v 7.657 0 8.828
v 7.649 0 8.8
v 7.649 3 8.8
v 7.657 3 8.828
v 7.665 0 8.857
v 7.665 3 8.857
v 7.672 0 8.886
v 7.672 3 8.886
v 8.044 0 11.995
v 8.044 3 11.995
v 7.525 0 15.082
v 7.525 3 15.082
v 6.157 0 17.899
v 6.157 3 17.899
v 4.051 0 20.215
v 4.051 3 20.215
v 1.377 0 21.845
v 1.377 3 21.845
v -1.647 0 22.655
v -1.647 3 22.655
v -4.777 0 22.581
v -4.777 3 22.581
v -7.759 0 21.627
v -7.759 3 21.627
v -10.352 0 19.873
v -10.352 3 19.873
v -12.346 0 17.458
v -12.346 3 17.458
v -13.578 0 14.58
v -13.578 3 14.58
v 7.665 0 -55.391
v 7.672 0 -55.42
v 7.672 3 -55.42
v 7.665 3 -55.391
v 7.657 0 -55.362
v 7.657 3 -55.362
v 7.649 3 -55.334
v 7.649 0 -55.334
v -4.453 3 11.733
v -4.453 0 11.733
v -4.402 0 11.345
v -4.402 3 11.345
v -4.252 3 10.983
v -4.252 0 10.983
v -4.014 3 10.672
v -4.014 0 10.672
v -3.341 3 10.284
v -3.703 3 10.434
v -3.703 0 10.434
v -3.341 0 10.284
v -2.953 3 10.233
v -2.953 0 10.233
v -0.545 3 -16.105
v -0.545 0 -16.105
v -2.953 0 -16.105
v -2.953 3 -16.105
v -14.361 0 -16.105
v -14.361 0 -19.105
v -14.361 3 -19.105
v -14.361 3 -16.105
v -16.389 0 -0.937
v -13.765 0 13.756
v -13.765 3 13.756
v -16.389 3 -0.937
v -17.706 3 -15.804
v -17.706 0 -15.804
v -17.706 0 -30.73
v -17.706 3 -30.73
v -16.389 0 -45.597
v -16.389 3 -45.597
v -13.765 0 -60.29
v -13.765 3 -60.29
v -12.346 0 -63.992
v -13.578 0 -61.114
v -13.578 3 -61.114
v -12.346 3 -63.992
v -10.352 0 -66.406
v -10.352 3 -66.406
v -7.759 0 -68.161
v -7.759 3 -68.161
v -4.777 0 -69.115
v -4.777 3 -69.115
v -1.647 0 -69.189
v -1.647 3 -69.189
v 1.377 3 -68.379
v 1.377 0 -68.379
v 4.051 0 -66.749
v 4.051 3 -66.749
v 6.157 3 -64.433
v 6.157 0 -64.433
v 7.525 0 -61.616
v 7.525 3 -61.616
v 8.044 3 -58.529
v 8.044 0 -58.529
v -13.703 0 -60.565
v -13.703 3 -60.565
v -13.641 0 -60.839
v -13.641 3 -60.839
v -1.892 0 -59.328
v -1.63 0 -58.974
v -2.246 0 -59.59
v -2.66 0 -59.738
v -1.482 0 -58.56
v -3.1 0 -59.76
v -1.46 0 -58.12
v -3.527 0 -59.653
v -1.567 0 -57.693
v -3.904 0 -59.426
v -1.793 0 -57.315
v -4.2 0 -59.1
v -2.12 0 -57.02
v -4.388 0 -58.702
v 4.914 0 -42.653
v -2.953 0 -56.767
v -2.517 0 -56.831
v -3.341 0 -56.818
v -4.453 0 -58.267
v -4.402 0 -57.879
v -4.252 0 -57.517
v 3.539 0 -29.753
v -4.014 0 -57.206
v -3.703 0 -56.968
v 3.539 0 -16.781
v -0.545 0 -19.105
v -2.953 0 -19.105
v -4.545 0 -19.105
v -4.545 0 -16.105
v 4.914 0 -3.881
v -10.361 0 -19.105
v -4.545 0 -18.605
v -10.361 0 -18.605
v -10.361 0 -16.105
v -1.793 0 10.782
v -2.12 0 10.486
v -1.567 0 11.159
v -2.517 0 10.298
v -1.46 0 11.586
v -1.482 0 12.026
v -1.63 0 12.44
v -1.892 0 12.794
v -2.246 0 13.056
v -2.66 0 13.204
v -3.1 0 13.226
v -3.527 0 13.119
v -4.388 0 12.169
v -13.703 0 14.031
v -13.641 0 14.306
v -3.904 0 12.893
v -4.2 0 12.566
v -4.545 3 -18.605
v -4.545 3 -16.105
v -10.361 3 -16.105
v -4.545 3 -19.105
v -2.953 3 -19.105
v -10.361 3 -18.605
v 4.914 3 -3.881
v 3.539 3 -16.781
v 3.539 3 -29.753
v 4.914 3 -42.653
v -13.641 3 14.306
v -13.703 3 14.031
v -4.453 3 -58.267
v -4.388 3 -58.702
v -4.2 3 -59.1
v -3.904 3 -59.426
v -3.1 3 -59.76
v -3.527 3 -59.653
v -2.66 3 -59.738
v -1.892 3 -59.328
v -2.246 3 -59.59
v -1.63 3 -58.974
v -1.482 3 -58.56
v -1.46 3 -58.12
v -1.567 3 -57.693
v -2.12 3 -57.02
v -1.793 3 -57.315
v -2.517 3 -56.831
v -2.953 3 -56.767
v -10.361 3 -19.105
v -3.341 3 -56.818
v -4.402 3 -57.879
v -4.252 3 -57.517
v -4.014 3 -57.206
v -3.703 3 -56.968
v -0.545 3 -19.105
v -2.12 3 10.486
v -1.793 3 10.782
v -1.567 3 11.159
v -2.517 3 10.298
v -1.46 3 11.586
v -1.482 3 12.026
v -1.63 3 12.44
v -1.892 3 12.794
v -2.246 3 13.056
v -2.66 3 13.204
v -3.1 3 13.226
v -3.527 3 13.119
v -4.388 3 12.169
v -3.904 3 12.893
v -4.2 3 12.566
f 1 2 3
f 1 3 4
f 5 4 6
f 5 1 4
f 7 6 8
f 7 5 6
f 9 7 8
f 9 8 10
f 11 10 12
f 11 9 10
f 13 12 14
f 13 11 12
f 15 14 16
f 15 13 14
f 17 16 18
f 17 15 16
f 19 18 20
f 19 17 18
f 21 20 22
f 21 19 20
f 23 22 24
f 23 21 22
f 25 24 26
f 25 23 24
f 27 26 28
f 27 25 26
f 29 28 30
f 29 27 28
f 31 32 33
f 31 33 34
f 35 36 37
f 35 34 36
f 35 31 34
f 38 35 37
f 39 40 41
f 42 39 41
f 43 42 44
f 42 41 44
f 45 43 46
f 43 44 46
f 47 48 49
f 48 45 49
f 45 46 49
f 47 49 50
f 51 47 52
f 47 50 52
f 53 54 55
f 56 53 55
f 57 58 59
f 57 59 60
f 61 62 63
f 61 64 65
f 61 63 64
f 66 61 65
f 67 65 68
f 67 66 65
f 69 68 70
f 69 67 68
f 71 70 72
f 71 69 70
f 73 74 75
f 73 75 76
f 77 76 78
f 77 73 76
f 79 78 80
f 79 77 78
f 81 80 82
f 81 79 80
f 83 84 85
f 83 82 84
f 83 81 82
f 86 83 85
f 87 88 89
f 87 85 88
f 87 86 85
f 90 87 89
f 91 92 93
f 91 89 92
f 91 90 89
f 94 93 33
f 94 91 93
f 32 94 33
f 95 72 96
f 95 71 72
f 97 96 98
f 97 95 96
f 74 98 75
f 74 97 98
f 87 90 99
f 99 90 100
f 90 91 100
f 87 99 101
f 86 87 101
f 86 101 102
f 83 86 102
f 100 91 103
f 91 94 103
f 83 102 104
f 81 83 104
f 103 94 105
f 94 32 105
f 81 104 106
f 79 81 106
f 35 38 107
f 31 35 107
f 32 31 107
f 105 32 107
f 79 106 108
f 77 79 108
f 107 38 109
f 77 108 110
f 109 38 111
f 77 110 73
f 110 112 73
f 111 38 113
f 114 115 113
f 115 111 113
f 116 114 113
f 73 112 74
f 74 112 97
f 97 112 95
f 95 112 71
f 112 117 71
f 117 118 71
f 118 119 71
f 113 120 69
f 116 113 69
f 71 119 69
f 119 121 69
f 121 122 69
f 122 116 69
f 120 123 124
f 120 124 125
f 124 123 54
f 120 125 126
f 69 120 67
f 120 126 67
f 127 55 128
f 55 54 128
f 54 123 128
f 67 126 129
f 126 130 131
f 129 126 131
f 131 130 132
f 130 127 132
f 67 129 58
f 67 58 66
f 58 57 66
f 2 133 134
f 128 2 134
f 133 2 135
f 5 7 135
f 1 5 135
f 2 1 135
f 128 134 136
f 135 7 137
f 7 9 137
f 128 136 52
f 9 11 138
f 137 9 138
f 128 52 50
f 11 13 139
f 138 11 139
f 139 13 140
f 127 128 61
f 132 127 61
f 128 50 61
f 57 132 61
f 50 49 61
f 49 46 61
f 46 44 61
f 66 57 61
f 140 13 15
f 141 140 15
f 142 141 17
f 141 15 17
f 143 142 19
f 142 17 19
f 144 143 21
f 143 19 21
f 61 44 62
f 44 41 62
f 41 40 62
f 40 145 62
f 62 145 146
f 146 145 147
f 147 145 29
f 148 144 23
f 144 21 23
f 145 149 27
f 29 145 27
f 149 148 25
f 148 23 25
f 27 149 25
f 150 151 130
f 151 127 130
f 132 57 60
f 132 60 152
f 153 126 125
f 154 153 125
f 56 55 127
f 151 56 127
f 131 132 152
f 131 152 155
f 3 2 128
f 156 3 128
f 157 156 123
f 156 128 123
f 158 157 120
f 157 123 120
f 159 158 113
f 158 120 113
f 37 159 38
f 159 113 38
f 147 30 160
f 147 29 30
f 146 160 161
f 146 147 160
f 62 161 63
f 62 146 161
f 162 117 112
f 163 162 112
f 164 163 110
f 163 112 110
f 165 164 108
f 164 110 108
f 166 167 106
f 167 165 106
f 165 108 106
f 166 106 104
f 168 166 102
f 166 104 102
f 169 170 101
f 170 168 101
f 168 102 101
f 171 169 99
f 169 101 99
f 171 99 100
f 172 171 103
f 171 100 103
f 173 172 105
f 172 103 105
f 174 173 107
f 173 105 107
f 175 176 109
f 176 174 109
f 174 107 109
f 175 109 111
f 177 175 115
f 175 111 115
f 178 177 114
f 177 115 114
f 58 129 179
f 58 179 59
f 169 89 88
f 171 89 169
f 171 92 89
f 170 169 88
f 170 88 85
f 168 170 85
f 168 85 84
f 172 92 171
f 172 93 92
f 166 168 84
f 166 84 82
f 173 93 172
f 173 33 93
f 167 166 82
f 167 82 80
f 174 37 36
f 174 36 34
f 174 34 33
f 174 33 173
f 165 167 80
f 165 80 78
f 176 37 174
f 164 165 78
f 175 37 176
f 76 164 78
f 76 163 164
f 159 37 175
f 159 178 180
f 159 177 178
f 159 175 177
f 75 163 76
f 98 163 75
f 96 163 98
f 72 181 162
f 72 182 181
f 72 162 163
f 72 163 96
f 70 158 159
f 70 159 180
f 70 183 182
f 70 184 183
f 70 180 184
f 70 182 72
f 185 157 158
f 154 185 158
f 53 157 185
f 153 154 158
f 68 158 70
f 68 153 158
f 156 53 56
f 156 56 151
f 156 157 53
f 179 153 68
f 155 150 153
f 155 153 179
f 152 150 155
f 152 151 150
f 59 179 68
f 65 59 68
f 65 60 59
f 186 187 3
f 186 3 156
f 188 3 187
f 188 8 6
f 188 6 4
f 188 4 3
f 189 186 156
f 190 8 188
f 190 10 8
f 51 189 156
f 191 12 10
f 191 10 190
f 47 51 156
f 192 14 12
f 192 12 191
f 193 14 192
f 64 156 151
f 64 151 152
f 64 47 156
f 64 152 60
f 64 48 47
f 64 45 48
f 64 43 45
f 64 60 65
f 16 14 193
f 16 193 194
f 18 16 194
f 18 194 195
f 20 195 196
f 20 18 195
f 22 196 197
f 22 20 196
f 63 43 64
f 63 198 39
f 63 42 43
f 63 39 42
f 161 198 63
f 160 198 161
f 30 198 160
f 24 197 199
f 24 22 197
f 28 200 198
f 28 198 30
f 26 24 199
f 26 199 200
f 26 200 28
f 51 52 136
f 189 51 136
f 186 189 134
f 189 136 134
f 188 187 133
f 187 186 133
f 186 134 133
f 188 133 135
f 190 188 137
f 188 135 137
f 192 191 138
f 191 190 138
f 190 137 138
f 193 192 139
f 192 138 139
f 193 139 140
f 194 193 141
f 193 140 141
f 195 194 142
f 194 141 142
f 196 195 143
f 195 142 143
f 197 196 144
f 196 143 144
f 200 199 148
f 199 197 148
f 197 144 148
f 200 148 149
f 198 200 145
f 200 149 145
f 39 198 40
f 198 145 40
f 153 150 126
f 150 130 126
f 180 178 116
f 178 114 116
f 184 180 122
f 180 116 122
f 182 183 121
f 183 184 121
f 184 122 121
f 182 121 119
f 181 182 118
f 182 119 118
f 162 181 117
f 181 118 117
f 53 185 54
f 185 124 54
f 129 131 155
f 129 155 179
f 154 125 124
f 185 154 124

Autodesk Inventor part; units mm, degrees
ref_plane "YZ Plane" through (0, 0, 0) normal (1, 0, 0) x (0, 1, 0)
ref_plane "XZ Plane" through (0, 0, 0) normal (0, 1, 0) x (-1, 0, 0)
ref_plane "XY Plane" through (0, 0, 0) normal (0, 0, 1) x (1, 0, 0)
sketch "Sketch1" plane through (0, 0, 0) normal (0, 1, 0) x (-1, 0, 0)
  arc A0 (13.7652, 13.7563) -> (-7.6488, 8.7996) centre (2.9529, 11.7331) ccw
  arc A1 (-7.6488, -55.3335) -> (13.7652, -60.2902) centre (2.9529, -58.2669) ccw
  arc A2 (-7.6723, -55.4199) -> (-7.6723, 8.8861) centre (-125.5725, -23.2669) ccw
  arc A3 (13.578, -61.1139) -> (13.578, 14.5801) centre (-151.1069, -23.2669) ccw
  circle A4 centre (2.9529, 11.7331) radius 1.5
  circle A5 centre (2.9529, -58.2669) radius 1.5
  line L0 (14.3609, -16.1047) -> (10.3609, -16.1047)
  line L1 (10.3609, -16.1047) -> (10.3609, -19.1047)
  line L2 (10.3609, -19.1047) -> (14.3609, -19.1047)
  line L3 (14.3609, -19.1047) -> (14.3609, -16.1047)
  line L4 (14.3609, -11.7669) -> (10.3609, -14.7669) construction
  line L5 (10.3609, -11.7669) -> (14.3609, -14.7669) construction
  line L6 (0.5448, -16.1047) -> (4.5448, -16.1047)
  line L7 (4.5448, -16.1047) -> (4.5448, -19.1047)
  line L8 (4.5448, -19.1047) -> (0.5448, -19.1047)
  line L9 (0.5448, -19.1047) -> (0.5448, -16.1047)
  line L10 (12.3609, -13.2669) -> (12.3609, -13.2669)
  line L11 (2.9529, 11.7331) -> (2.9529, -58.2669)
  line L12 (10.3609, -18.6047) -> (4.5448, -18.6047)
  line L13 (7.4529, -18.6047) -> (7.4529, -17.6047)
  point P0 (0, 0)
  dimension "d0" = 22
  dimension "d1" = 22
  dimension "d2" = 70
  dimension "d3" = 3
  dimension "d4" = 3
  dimension "d21" = 4
  dimension "d22" = 3
  dimension "d25" = 0
  dimension "d26" = 1
sketch "Sketch2" plane through (0, 0, 0) normal (0, 1, 0) x (-1, 0, 0)
  point P0 (0, 0)
extrude "Extrusion1" add sketch "Sketch1" along normal blind 3 contours A3 A1 A2 A0
sketch "Sketch3" plane through (0, 0, 0) normal (0, -1, 0) x (1, 0, 0)
  point P0 (0, 0)
sketch "Sketch4" plane through (0, 0, 0) normal (0, -1, 0) x (1, 0, 0)
  point P0 (0, 0)
sketch "Sketch5" plane through (0, 3, 0) normal (0, 1, 0) x (1, 0, 0)
  point P0 (0, 0)
sketch "Sketch6" plane through (0, 3, 0) normal (0, 1, 0) x (1, 0, 0)
  point P0 (0, 0)
properties part number "fem2"
